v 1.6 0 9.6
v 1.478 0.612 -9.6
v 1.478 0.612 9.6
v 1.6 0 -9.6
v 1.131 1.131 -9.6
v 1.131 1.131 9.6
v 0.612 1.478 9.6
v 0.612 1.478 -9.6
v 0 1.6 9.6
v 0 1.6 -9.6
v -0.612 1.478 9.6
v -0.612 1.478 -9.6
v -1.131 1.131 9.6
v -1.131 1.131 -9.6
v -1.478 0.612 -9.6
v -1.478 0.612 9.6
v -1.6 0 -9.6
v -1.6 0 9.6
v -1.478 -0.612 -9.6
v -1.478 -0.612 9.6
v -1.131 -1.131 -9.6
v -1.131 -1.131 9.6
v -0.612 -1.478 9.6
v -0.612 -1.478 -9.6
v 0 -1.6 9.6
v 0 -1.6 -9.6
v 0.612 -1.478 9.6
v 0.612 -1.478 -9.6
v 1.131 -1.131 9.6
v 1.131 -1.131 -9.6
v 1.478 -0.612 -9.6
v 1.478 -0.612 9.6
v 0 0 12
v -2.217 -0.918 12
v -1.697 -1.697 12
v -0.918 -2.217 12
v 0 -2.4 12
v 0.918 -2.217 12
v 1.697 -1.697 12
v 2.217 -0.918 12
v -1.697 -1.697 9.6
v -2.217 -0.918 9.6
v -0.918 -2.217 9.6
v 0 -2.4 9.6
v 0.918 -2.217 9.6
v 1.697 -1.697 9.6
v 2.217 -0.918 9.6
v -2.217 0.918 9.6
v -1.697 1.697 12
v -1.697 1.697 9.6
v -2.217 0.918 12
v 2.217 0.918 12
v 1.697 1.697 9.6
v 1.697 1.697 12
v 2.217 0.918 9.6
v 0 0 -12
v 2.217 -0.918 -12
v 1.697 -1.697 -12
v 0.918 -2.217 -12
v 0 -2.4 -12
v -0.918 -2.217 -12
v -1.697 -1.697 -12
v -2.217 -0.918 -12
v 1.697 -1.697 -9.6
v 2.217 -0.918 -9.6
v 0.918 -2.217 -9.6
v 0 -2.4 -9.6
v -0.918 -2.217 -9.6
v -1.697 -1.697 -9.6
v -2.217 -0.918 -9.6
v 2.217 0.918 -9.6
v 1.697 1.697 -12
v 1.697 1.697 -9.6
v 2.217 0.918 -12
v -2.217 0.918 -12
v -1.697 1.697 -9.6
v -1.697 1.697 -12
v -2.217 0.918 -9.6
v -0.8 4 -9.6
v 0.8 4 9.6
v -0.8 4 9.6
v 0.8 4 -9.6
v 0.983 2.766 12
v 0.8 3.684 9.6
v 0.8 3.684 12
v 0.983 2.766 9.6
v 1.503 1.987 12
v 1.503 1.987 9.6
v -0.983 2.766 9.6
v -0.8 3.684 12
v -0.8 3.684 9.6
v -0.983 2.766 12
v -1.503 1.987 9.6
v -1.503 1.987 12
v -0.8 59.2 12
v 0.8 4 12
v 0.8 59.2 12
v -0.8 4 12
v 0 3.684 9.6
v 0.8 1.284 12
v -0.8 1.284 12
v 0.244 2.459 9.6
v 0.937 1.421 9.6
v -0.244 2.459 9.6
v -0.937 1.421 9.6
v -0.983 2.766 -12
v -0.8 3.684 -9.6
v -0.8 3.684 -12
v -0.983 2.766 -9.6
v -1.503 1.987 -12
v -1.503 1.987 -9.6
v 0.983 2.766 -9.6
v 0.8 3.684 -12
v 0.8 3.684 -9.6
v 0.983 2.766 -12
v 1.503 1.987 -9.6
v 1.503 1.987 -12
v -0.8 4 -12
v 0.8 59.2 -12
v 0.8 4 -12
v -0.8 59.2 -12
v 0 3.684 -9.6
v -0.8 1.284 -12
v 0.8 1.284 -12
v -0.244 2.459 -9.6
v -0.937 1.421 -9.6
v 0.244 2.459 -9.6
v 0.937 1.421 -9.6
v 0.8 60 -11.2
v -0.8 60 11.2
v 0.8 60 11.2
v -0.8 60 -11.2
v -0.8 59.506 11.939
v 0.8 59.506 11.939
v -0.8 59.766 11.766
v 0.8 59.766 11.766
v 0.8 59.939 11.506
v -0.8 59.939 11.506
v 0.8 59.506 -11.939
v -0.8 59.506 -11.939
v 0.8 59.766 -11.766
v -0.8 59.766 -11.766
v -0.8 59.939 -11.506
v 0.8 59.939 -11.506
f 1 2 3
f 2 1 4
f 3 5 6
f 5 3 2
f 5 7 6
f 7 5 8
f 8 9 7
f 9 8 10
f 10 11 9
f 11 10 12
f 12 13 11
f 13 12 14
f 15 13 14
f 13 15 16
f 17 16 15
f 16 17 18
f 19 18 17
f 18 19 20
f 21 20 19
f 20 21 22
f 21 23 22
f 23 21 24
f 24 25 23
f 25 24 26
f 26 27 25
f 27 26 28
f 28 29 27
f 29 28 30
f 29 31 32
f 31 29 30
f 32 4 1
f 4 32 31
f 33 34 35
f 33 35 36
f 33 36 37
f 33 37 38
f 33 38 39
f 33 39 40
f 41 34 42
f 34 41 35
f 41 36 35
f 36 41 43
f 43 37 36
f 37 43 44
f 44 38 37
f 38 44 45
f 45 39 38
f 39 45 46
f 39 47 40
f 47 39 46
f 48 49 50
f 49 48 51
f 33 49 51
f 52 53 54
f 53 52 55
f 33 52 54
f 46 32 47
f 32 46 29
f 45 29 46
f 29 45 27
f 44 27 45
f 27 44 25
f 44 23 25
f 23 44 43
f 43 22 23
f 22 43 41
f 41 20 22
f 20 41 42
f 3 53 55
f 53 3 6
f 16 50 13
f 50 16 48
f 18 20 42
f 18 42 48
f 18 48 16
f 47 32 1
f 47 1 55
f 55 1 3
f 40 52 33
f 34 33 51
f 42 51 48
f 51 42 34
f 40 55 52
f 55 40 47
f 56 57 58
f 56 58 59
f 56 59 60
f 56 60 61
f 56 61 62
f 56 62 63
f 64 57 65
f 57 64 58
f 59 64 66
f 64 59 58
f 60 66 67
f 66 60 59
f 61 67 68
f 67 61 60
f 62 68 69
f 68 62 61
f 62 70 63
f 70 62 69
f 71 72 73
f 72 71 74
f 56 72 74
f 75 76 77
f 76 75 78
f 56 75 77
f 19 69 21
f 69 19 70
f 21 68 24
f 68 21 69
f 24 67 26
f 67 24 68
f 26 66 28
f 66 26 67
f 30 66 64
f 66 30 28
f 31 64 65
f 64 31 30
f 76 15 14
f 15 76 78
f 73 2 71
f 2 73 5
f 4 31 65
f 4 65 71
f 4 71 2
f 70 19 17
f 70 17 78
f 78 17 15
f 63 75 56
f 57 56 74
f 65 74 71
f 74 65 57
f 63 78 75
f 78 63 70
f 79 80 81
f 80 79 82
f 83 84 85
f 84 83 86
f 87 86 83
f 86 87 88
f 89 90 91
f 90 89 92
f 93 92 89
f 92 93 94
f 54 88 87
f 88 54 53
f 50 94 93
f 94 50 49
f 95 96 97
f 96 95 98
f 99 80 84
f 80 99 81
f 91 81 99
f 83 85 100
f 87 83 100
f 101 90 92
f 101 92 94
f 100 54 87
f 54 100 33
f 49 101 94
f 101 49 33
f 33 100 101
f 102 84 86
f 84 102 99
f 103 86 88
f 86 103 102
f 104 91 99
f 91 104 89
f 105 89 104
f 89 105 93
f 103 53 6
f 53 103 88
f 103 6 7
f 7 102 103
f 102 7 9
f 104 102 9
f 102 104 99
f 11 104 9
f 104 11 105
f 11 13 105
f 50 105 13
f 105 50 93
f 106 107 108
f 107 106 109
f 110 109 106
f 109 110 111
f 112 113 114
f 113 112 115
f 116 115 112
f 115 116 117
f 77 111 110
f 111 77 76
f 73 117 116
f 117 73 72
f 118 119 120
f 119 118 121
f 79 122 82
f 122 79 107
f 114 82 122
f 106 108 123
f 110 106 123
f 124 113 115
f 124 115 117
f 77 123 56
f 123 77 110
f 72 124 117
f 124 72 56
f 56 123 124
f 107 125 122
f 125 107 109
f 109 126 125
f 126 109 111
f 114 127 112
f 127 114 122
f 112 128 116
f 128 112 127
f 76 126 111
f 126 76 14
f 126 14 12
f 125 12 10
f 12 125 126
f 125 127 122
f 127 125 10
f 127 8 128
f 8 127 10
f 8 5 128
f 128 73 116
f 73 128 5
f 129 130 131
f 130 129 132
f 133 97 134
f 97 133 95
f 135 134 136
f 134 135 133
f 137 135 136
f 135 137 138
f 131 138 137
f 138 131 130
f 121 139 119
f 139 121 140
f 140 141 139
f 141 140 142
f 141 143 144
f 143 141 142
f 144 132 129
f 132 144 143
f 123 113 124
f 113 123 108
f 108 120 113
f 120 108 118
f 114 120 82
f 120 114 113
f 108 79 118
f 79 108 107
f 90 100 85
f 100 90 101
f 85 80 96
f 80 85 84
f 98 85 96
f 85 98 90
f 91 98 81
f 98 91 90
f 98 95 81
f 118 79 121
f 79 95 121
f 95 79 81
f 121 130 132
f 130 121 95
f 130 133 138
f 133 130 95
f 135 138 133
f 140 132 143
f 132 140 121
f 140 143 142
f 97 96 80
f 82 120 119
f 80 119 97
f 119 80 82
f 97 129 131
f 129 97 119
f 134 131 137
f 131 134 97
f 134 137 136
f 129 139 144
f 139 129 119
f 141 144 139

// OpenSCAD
use <../lib.scad>
use <../p/1-4chrd.scad>
use <s/35252s01.scad>
function ldraw_lib__35252() = [
// 0 Flag  8 x  3 with Rod without Reinforced Base and Flat Sides
// 0 Name: 35252.dat
// 0 Author: Orion Pobursky [OrionP]
// 0 !LDRAW_ORG Part UPDATE 2020-03
// 0 !LICENSE Licensed under CC BY 2.0 and CC BY 4.0 : see CAreadme.txt
// 
// 0 BFC CERTIFY CCW
  [0,"BFC","CERTIFY"],
  [0,"BFC","CCW"],
// 
// 0 !HISTORY 2020-12-29 [PTadmin] Official Update 2020-03
// 
// 
// 1 16 0 0 0 1 0 0 0 1 0 0 0 1 s\35252s01.dat
  [1,16,0,0,0,1,0,0,0,1,0,0,0,1, ldraw_lib__s__35252s01()],
// 
// 3 16 -2 -30 10 -2 -30 148 -2 -24 10
  [3,16,-2,-30,10,-2,-30,148,-2,-24,10],
// 3 16 -2 30 10 -2 24 10 -2 30 148
  [3,16,-2,30,10,-2,24,10,-2,30,148],
// 4 16 -2 -30 148 -2 30 148 -2 24 10 -2 -24 10
  [4,16,-2,-30,148,-2,30,148,-2,24,10,-2,-24,10],
// 4 16 -2 -30 148 -2 -28 150 -2 28 150 -2 30 148
  [4,16,-2,-30,148,-2,-28,150,-2,28,150,-2,30,148],
// 1 16 -2 -28 148 0 1 0 -2 0 0 0 0 2 1-4chrd.dat
  [1,16,-2,-28,148,0,1,0,-2,0,0,0,0,2, ldraw_lib__1_4chrd()],
// 1 16 -2 28 148 0 1 0 2 0 0 0 0 2 1-4chrd.dat
  [1,16,-2,28,148,0,1,0,2,0,0,0,0,2, ldraw_lib__1_4chrd()],
// 
// 3 16 2 -30 148 2 -30 10 2 -24 10
  [3,16,2,-30,148,2,-30,10,2,-24,10],
// 3 16 2 24 10 2 30 10 2 30 148
  [3,16,2,24,10,2,30,10,2,30,148],
// 4 16 2 24 10 2 30 148 2 -30 148 2 -24 10
  [4,16,2,24,10,2,30,148,2,-30,148,2,-24,10],
// 4 16 2 28 150 2 -28 150 2 -30 148 2 30 148
  [4,16,2,28,150,2,-28,150,2,-30,148,2,30,148],
// 1 16 2 -28 148 0 -1 0 -2 0 0 0 0 2 1-4chrd.dat
  [1,16,2,-28,148,0,-1,0,-2,0,0,0,0,2, ldraw_lib__1_4chrd()],
// 1 16 2 28 148 0 -1 0 2 0 0 0 0 2 1-4chrd.dat
  [1,16,2,28,148,0,-1,0,2,0,0,0,0,2, ldraw_lib__1_4chrd()],
];
makepoly(ldraw_lib__35252(), line=0.2);
